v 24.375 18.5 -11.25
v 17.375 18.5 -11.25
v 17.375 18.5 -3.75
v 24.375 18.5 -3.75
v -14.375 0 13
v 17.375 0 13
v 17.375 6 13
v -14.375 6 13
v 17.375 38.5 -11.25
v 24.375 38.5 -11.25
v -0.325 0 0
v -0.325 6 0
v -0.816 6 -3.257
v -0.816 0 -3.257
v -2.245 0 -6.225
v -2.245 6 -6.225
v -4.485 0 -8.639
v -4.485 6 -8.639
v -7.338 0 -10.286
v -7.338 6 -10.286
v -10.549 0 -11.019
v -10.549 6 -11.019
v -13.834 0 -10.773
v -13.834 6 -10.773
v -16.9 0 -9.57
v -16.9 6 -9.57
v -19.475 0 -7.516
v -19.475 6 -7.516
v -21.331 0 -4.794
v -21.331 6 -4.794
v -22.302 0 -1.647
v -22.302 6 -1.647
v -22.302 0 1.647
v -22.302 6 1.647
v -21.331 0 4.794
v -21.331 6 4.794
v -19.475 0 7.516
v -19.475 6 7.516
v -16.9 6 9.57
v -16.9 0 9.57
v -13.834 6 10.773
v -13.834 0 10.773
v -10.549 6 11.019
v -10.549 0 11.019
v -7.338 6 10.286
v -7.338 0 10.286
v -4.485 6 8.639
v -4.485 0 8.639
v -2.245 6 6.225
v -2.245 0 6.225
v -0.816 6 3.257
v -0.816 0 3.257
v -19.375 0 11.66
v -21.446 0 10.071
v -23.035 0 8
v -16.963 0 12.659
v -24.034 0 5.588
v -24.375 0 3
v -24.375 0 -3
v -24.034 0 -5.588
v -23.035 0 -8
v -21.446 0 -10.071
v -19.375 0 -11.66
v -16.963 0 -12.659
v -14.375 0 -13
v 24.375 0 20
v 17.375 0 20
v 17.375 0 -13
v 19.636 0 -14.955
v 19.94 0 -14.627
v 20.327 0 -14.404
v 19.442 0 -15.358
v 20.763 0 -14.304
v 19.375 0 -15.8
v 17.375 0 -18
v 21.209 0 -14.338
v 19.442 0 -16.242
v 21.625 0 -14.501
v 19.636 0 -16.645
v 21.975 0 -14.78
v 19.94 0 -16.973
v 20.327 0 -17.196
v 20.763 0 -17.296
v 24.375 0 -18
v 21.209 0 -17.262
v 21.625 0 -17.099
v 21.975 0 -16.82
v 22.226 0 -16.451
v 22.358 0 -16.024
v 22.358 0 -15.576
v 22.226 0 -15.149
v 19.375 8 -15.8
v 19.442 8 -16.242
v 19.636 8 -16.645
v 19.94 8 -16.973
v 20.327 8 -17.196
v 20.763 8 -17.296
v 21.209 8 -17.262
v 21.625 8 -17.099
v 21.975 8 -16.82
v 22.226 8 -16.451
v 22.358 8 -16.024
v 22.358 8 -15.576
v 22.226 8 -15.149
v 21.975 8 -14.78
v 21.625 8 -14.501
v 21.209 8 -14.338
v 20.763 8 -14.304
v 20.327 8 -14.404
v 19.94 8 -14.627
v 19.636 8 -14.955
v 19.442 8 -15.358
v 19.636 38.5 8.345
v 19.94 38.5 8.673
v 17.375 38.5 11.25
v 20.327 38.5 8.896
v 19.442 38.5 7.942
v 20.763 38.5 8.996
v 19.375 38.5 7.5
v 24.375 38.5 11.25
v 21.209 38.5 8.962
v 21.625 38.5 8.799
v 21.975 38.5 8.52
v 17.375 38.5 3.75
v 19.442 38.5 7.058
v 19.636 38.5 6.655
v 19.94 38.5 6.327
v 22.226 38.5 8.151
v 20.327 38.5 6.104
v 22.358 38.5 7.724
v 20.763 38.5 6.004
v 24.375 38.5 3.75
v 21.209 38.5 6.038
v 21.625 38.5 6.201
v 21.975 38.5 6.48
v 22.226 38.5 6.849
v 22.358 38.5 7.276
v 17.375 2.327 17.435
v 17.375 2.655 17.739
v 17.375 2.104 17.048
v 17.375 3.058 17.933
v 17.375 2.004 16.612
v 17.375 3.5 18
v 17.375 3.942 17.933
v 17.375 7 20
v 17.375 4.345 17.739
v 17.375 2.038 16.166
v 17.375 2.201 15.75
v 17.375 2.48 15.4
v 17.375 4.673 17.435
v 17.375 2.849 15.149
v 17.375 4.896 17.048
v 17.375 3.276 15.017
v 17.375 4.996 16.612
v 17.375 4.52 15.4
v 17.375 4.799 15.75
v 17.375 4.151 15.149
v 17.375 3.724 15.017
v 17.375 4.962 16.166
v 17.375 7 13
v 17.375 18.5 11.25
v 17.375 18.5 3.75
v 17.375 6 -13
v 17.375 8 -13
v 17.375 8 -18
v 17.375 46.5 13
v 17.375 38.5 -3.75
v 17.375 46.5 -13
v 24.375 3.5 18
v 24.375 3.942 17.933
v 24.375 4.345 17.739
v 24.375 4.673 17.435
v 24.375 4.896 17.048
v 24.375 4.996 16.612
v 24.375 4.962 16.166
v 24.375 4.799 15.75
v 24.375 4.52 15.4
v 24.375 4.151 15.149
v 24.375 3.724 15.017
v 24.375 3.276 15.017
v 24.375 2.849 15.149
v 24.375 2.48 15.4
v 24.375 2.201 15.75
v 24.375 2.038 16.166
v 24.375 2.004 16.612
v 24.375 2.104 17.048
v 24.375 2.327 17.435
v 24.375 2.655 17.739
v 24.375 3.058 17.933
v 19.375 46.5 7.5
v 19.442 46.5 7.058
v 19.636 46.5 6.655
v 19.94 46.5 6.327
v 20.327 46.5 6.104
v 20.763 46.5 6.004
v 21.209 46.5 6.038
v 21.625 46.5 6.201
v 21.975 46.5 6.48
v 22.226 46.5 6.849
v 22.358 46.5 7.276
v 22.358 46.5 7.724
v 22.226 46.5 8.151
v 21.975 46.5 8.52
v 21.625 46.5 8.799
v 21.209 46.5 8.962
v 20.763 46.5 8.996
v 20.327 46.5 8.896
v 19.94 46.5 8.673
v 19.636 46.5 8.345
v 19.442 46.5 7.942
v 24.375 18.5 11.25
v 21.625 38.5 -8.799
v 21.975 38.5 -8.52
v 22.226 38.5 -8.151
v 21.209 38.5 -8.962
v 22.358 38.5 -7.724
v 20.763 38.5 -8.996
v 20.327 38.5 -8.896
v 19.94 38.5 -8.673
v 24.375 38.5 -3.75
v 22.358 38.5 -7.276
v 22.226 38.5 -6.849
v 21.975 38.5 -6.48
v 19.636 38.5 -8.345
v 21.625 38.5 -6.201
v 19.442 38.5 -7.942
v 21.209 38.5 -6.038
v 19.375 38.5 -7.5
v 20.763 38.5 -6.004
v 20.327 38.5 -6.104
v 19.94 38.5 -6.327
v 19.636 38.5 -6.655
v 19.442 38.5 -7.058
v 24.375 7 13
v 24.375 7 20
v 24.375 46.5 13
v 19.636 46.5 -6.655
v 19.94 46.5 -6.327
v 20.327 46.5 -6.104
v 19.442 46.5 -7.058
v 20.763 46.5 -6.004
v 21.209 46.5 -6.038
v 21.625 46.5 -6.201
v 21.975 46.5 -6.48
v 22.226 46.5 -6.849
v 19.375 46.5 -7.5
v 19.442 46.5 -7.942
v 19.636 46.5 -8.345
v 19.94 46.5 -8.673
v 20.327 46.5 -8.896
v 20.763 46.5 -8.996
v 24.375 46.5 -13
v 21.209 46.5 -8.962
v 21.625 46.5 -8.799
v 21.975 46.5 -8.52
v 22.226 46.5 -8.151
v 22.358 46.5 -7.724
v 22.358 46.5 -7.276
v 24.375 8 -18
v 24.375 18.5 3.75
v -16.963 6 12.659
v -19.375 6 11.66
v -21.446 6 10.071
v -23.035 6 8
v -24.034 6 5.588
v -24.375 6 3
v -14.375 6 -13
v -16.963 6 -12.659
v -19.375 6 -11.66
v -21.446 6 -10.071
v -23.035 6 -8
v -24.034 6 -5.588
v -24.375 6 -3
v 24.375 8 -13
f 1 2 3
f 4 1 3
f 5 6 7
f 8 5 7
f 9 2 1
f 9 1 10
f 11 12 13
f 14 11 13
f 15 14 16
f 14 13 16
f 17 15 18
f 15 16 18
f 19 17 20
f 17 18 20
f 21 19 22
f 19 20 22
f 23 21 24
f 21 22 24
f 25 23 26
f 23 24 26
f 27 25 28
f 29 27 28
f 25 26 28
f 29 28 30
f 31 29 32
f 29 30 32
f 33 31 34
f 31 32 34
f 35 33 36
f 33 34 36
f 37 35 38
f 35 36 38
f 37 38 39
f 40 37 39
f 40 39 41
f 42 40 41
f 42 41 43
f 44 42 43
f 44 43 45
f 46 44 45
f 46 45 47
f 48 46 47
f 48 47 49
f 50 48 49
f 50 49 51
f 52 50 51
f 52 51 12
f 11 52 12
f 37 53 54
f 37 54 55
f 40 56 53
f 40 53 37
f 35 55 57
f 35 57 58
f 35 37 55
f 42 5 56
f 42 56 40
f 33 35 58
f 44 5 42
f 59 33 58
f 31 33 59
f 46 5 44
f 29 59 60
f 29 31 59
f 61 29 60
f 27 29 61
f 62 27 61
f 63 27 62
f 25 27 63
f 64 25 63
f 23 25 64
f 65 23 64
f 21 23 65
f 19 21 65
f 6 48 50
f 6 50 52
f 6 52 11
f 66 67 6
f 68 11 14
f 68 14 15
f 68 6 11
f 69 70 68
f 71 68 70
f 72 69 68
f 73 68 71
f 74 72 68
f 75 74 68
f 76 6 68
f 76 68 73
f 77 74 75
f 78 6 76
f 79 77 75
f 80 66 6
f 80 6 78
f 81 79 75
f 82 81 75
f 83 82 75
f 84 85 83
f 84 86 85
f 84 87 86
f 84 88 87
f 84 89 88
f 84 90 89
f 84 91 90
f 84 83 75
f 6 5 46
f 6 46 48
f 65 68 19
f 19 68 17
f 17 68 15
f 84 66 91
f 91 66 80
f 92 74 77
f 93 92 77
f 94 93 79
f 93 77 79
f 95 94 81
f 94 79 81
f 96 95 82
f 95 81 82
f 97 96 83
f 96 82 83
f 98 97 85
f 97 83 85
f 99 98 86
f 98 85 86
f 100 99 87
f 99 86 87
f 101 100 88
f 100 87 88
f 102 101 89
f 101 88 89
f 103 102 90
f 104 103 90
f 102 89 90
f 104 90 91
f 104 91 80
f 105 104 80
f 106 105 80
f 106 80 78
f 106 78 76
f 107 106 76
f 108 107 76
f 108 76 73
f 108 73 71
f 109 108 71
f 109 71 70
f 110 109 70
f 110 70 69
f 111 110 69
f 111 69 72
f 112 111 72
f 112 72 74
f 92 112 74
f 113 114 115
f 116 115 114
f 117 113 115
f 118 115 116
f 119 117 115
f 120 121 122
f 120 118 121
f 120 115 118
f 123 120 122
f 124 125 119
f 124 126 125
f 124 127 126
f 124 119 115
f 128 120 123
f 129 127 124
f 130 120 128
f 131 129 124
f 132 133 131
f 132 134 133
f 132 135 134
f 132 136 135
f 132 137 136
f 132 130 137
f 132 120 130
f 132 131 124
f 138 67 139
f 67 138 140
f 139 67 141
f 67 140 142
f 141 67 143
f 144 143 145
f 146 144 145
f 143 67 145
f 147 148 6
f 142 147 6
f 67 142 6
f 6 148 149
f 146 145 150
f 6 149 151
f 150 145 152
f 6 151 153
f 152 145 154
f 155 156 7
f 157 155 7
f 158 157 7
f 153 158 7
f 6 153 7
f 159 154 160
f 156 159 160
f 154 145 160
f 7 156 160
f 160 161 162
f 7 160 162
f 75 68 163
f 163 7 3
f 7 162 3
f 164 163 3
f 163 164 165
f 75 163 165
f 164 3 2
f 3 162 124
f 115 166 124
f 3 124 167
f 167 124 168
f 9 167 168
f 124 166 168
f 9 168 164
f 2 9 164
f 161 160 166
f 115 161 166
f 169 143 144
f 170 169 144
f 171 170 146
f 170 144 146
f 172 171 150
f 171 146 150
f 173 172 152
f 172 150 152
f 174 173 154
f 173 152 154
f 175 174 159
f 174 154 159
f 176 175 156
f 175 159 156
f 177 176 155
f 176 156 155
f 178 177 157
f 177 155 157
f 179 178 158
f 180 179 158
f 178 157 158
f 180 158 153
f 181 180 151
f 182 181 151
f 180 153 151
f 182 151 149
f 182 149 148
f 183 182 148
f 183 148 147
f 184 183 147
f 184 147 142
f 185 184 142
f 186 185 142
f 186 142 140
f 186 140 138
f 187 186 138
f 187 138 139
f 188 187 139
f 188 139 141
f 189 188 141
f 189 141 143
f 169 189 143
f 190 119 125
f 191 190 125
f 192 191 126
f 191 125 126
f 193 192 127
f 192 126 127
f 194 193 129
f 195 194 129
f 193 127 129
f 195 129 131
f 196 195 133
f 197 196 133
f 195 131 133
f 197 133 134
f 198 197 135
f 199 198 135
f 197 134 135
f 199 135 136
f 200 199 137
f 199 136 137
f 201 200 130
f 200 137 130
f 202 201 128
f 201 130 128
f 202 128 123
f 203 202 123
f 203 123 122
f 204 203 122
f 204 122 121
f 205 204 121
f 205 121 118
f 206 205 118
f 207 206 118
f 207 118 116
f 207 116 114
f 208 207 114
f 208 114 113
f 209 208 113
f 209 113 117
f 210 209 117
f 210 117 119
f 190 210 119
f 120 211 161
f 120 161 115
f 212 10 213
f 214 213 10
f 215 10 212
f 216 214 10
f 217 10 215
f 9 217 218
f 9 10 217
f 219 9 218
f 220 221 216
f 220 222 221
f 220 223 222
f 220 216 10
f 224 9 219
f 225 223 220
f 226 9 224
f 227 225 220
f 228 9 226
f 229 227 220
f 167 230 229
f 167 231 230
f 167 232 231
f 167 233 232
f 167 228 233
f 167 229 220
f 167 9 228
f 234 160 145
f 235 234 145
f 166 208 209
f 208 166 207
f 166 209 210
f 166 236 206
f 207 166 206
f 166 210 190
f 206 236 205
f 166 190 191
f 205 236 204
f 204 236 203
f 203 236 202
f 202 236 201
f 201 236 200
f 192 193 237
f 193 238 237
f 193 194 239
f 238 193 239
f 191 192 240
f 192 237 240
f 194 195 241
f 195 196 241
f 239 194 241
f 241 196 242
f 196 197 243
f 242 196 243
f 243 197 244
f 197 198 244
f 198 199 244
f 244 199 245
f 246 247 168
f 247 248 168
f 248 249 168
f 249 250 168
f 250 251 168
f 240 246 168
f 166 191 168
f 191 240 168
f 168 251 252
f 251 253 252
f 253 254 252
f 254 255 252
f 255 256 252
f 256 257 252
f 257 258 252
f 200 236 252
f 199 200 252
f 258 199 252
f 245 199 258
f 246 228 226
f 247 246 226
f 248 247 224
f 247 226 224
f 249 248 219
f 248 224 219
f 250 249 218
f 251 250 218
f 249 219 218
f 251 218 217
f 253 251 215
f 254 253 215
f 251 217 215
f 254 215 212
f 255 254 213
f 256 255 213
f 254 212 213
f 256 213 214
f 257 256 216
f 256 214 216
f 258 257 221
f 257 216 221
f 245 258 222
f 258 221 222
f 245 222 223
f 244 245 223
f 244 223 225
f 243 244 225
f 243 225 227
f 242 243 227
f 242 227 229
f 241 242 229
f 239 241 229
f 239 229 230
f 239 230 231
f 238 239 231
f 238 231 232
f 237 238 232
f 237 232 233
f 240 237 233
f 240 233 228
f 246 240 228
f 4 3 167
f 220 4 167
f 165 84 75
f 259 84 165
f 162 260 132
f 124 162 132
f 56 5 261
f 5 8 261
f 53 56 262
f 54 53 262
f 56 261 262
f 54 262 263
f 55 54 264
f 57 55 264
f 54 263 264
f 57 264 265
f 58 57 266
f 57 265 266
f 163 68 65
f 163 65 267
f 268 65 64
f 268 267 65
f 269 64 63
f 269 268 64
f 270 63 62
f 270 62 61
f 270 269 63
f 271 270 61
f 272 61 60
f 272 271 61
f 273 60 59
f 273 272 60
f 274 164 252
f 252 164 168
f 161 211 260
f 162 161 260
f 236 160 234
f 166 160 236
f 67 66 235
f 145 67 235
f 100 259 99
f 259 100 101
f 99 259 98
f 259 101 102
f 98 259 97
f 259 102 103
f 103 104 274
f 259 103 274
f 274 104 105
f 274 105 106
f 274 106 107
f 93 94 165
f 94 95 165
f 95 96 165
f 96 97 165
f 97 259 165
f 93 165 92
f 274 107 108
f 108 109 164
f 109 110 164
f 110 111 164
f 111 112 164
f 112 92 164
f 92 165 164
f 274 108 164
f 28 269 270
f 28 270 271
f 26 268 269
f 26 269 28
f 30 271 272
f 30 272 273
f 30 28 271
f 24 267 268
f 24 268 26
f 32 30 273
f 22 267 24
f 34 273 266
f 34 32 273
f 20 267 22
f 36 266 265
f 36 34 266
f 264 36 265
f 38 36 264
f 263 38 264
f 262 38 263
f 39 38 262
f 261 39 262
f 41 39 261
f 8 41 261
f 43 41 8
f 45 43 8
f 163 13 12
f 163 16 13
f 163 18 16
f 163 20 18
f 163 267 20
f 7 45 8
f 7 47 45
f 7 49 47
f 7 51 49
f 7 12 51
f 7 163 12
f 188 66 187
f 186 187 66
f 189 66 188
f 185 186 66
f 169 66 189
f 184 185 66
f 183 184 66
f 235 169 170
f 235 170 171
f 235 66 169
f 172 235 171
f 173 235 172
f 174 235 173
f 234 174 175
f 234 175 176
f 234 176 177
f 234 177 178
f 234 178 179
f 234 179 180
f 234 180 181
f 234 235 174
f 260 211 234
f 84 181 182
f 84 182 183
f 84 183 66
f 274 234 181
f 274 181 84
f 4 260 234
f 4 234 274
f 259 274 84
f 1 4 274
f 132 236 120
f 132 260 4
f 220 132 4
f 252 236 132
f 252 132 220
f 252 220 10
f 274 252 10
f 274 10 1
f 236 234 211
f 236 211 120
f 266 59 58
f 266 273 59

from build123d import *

# Parameters (mm, degrees)
SKETCH_1_W                = 38
SKETCH_1_H                = 46.5
EXTRUDE_1_DEPTH           = 7
SKETCH_2_W                = 5
SKETCH_2_H                = 38.5
CUT_EXTRUDE_1_DEPTH       = 52.100391388
SKETCH_3_W                = 7
SKETCH_3_H                = 39.5
CUT_EXTRUDE_2_DEPTH       = 52.100391388
SKETCH_4_W                = 7.5
SKETCH_4_H                = 20
CUT_EXTRUDE_3_DEPTH       = 52.100391388
SKETCH_5_W                = 7.5
SKETCH_5_H                = 20
CUT_EXTRUDE_4_DEPTH       = 52.100391388
SKETCH_6_W                = 26
SKETCH_6_H                = 6
EXTRUDE_2_DEPTH           = 41.75
HOLE_WIZARD_3_0_3_1_D     = 3
HOLE_WIZARD_3_0_3_1_DEPTH = 8
HOLE_WIZARD_3_0_3_2_D     = 3
HOLE_WIZARD_3_0_3_2_DEPTH = 48.75
HOLE_WIZARD_3_0_3_3_D     = 3
HOLE_WIZARD_M201_D        = 22.1
HOLE_WIZARD_M201_DEPTH    = 46.5
FILLET_1_R                = 10


with BuildPart() as part:
    # Эскиз1 → Бобышка-Вытянуть1 (new body)
    with BuildSketch(Plane(origin=(24.375, 0, 0), x_dir=(0, 0, -1), z_dir=(1, 0, 0))):
        with Locations((-1, 23.25)):
            Rectangle(SKETCH_1_W, SKETCH_1_H)
    extrude(amount=-EXTRUDE_1_DEPTH)

    # Эскиз2 → Вырез-Вытянуть1 (cut, through all)
    with BuildSketch(Plane.ZY.offset(-17.375)):
        with Locations((-15.5, 27.25)):
            Rectangle(SKETCH_2_W, SKETCH_2_H)
    extrude(amount=-CUT_EXTRUDE_1_DEPTH, mode=Mode.SUBTRACT)

    # Эскиз3 → Вырез-Вытянуть2 (cut, through all)
    with BuildSketch(Plane.ZY.offset(-17.375)):
        with Locations((16.5, 26.75)):
            Rectangle(SKETCH_3_W, SKETCH_3_H)
    extrude(amount=-CUT_EXTRUDE_2_DEPTH, mode=Mode.SUBTRACT)

    # Эскиз4 → Вырез-Вытянуть3 (cut, through all)
    with BuildSketch(Plane(origin=(24.375, 0, 0), x_dir=(0, 0, -1), z_dir=(1, 0, 0))):
        with Locations((-7.5, 28.5)):
            Rectangle(SKETCH_4_W, SKETCH_4_H)
    extrude(amount=-CUT_EXTRUDE_3_DEPTH, mode=Mode.SUBTRACT)

    # Эскиз5 → Вырез-Вытянуть4 (cut, through all)
    with BuildSketch(Plane.ZY.offset(-17.375)):
        with Locations((-7.5, 28.5)):
            Rectangle(SKETCH_5_W, SKETCH_5_H)
    extrude(amount=-CUT_EXTRUDE_4_DEPTH, mode=Mode.SUBTRACT)

    # Эскиз6 → Бобышка-Вытянуть2 (add)
    with BuildSketch(Plane.ZY.offset(-17.375)):
        with Locations((0, 3)):
            Rectangle(SKETCH_6_W, SKETCH_6_H)
    extrude(amount=EXTRUDE_2_DEPTH)

    # Диаметр отверстия Ø3.0 (3)1
    with Locations(Plane(origin=(0, 46.5, 0), x_dir=(1, 0, 0), z_dir=(0, 1, 0))):
        with Locations((20.875, -7.5), (20.875, 7.5)):
            Hole(HOLE_WIZARD_3_0_3_1_D / 2, depth=HOLE_WIZARD_3_0_3_1_DEPTH)

    # Диаметр отверстия Ø3.0 (3)2
    with Locations(Plane(origin=(24.375, 0, 0), x_dir=(0, 0, -1), z_dir=(1, 0, 0))):
        with Locations((-16.5, 3.5)):
            Hole(HOLE_WIZARD_3_0_3_2_D / 2, depth=HOLE_WIZARD_3_0_3_2_DEPTH)

    # Диаметр отверстия Ø3.0 (3)3 (through all)
    with Locations(Plane(origin=(0, 8, 0), x_dir=(1, 0, 0), z_dir=(0, 1, 0))):
        with Locations((20.875, 15.8)):
            Hole(HOLE_WIZARD_3_0_3_3_D / 2)

    # Отверстие с зазором M201
    with Locations(Plane(origin=(0, 0, 0), x_dir=(-1, 0, 0), z_dir=(0, -1, 0))):
        with Locations((11.375, 0)):
            Hole(HOLE_WIZARD_M201_D / 2, depth=HOLE_WIZARD_M201_DEPTH)

    # Скругление1
    fillet_1_edges = [part.edges().sort_by_distance(p)[0] for p in [
        (-24.375, 3, -13),
        (-24.375, 3, 13),
    ]]
    fillet(fillet_1_edges, radius=FILLET_1_R)


solid = part.part
